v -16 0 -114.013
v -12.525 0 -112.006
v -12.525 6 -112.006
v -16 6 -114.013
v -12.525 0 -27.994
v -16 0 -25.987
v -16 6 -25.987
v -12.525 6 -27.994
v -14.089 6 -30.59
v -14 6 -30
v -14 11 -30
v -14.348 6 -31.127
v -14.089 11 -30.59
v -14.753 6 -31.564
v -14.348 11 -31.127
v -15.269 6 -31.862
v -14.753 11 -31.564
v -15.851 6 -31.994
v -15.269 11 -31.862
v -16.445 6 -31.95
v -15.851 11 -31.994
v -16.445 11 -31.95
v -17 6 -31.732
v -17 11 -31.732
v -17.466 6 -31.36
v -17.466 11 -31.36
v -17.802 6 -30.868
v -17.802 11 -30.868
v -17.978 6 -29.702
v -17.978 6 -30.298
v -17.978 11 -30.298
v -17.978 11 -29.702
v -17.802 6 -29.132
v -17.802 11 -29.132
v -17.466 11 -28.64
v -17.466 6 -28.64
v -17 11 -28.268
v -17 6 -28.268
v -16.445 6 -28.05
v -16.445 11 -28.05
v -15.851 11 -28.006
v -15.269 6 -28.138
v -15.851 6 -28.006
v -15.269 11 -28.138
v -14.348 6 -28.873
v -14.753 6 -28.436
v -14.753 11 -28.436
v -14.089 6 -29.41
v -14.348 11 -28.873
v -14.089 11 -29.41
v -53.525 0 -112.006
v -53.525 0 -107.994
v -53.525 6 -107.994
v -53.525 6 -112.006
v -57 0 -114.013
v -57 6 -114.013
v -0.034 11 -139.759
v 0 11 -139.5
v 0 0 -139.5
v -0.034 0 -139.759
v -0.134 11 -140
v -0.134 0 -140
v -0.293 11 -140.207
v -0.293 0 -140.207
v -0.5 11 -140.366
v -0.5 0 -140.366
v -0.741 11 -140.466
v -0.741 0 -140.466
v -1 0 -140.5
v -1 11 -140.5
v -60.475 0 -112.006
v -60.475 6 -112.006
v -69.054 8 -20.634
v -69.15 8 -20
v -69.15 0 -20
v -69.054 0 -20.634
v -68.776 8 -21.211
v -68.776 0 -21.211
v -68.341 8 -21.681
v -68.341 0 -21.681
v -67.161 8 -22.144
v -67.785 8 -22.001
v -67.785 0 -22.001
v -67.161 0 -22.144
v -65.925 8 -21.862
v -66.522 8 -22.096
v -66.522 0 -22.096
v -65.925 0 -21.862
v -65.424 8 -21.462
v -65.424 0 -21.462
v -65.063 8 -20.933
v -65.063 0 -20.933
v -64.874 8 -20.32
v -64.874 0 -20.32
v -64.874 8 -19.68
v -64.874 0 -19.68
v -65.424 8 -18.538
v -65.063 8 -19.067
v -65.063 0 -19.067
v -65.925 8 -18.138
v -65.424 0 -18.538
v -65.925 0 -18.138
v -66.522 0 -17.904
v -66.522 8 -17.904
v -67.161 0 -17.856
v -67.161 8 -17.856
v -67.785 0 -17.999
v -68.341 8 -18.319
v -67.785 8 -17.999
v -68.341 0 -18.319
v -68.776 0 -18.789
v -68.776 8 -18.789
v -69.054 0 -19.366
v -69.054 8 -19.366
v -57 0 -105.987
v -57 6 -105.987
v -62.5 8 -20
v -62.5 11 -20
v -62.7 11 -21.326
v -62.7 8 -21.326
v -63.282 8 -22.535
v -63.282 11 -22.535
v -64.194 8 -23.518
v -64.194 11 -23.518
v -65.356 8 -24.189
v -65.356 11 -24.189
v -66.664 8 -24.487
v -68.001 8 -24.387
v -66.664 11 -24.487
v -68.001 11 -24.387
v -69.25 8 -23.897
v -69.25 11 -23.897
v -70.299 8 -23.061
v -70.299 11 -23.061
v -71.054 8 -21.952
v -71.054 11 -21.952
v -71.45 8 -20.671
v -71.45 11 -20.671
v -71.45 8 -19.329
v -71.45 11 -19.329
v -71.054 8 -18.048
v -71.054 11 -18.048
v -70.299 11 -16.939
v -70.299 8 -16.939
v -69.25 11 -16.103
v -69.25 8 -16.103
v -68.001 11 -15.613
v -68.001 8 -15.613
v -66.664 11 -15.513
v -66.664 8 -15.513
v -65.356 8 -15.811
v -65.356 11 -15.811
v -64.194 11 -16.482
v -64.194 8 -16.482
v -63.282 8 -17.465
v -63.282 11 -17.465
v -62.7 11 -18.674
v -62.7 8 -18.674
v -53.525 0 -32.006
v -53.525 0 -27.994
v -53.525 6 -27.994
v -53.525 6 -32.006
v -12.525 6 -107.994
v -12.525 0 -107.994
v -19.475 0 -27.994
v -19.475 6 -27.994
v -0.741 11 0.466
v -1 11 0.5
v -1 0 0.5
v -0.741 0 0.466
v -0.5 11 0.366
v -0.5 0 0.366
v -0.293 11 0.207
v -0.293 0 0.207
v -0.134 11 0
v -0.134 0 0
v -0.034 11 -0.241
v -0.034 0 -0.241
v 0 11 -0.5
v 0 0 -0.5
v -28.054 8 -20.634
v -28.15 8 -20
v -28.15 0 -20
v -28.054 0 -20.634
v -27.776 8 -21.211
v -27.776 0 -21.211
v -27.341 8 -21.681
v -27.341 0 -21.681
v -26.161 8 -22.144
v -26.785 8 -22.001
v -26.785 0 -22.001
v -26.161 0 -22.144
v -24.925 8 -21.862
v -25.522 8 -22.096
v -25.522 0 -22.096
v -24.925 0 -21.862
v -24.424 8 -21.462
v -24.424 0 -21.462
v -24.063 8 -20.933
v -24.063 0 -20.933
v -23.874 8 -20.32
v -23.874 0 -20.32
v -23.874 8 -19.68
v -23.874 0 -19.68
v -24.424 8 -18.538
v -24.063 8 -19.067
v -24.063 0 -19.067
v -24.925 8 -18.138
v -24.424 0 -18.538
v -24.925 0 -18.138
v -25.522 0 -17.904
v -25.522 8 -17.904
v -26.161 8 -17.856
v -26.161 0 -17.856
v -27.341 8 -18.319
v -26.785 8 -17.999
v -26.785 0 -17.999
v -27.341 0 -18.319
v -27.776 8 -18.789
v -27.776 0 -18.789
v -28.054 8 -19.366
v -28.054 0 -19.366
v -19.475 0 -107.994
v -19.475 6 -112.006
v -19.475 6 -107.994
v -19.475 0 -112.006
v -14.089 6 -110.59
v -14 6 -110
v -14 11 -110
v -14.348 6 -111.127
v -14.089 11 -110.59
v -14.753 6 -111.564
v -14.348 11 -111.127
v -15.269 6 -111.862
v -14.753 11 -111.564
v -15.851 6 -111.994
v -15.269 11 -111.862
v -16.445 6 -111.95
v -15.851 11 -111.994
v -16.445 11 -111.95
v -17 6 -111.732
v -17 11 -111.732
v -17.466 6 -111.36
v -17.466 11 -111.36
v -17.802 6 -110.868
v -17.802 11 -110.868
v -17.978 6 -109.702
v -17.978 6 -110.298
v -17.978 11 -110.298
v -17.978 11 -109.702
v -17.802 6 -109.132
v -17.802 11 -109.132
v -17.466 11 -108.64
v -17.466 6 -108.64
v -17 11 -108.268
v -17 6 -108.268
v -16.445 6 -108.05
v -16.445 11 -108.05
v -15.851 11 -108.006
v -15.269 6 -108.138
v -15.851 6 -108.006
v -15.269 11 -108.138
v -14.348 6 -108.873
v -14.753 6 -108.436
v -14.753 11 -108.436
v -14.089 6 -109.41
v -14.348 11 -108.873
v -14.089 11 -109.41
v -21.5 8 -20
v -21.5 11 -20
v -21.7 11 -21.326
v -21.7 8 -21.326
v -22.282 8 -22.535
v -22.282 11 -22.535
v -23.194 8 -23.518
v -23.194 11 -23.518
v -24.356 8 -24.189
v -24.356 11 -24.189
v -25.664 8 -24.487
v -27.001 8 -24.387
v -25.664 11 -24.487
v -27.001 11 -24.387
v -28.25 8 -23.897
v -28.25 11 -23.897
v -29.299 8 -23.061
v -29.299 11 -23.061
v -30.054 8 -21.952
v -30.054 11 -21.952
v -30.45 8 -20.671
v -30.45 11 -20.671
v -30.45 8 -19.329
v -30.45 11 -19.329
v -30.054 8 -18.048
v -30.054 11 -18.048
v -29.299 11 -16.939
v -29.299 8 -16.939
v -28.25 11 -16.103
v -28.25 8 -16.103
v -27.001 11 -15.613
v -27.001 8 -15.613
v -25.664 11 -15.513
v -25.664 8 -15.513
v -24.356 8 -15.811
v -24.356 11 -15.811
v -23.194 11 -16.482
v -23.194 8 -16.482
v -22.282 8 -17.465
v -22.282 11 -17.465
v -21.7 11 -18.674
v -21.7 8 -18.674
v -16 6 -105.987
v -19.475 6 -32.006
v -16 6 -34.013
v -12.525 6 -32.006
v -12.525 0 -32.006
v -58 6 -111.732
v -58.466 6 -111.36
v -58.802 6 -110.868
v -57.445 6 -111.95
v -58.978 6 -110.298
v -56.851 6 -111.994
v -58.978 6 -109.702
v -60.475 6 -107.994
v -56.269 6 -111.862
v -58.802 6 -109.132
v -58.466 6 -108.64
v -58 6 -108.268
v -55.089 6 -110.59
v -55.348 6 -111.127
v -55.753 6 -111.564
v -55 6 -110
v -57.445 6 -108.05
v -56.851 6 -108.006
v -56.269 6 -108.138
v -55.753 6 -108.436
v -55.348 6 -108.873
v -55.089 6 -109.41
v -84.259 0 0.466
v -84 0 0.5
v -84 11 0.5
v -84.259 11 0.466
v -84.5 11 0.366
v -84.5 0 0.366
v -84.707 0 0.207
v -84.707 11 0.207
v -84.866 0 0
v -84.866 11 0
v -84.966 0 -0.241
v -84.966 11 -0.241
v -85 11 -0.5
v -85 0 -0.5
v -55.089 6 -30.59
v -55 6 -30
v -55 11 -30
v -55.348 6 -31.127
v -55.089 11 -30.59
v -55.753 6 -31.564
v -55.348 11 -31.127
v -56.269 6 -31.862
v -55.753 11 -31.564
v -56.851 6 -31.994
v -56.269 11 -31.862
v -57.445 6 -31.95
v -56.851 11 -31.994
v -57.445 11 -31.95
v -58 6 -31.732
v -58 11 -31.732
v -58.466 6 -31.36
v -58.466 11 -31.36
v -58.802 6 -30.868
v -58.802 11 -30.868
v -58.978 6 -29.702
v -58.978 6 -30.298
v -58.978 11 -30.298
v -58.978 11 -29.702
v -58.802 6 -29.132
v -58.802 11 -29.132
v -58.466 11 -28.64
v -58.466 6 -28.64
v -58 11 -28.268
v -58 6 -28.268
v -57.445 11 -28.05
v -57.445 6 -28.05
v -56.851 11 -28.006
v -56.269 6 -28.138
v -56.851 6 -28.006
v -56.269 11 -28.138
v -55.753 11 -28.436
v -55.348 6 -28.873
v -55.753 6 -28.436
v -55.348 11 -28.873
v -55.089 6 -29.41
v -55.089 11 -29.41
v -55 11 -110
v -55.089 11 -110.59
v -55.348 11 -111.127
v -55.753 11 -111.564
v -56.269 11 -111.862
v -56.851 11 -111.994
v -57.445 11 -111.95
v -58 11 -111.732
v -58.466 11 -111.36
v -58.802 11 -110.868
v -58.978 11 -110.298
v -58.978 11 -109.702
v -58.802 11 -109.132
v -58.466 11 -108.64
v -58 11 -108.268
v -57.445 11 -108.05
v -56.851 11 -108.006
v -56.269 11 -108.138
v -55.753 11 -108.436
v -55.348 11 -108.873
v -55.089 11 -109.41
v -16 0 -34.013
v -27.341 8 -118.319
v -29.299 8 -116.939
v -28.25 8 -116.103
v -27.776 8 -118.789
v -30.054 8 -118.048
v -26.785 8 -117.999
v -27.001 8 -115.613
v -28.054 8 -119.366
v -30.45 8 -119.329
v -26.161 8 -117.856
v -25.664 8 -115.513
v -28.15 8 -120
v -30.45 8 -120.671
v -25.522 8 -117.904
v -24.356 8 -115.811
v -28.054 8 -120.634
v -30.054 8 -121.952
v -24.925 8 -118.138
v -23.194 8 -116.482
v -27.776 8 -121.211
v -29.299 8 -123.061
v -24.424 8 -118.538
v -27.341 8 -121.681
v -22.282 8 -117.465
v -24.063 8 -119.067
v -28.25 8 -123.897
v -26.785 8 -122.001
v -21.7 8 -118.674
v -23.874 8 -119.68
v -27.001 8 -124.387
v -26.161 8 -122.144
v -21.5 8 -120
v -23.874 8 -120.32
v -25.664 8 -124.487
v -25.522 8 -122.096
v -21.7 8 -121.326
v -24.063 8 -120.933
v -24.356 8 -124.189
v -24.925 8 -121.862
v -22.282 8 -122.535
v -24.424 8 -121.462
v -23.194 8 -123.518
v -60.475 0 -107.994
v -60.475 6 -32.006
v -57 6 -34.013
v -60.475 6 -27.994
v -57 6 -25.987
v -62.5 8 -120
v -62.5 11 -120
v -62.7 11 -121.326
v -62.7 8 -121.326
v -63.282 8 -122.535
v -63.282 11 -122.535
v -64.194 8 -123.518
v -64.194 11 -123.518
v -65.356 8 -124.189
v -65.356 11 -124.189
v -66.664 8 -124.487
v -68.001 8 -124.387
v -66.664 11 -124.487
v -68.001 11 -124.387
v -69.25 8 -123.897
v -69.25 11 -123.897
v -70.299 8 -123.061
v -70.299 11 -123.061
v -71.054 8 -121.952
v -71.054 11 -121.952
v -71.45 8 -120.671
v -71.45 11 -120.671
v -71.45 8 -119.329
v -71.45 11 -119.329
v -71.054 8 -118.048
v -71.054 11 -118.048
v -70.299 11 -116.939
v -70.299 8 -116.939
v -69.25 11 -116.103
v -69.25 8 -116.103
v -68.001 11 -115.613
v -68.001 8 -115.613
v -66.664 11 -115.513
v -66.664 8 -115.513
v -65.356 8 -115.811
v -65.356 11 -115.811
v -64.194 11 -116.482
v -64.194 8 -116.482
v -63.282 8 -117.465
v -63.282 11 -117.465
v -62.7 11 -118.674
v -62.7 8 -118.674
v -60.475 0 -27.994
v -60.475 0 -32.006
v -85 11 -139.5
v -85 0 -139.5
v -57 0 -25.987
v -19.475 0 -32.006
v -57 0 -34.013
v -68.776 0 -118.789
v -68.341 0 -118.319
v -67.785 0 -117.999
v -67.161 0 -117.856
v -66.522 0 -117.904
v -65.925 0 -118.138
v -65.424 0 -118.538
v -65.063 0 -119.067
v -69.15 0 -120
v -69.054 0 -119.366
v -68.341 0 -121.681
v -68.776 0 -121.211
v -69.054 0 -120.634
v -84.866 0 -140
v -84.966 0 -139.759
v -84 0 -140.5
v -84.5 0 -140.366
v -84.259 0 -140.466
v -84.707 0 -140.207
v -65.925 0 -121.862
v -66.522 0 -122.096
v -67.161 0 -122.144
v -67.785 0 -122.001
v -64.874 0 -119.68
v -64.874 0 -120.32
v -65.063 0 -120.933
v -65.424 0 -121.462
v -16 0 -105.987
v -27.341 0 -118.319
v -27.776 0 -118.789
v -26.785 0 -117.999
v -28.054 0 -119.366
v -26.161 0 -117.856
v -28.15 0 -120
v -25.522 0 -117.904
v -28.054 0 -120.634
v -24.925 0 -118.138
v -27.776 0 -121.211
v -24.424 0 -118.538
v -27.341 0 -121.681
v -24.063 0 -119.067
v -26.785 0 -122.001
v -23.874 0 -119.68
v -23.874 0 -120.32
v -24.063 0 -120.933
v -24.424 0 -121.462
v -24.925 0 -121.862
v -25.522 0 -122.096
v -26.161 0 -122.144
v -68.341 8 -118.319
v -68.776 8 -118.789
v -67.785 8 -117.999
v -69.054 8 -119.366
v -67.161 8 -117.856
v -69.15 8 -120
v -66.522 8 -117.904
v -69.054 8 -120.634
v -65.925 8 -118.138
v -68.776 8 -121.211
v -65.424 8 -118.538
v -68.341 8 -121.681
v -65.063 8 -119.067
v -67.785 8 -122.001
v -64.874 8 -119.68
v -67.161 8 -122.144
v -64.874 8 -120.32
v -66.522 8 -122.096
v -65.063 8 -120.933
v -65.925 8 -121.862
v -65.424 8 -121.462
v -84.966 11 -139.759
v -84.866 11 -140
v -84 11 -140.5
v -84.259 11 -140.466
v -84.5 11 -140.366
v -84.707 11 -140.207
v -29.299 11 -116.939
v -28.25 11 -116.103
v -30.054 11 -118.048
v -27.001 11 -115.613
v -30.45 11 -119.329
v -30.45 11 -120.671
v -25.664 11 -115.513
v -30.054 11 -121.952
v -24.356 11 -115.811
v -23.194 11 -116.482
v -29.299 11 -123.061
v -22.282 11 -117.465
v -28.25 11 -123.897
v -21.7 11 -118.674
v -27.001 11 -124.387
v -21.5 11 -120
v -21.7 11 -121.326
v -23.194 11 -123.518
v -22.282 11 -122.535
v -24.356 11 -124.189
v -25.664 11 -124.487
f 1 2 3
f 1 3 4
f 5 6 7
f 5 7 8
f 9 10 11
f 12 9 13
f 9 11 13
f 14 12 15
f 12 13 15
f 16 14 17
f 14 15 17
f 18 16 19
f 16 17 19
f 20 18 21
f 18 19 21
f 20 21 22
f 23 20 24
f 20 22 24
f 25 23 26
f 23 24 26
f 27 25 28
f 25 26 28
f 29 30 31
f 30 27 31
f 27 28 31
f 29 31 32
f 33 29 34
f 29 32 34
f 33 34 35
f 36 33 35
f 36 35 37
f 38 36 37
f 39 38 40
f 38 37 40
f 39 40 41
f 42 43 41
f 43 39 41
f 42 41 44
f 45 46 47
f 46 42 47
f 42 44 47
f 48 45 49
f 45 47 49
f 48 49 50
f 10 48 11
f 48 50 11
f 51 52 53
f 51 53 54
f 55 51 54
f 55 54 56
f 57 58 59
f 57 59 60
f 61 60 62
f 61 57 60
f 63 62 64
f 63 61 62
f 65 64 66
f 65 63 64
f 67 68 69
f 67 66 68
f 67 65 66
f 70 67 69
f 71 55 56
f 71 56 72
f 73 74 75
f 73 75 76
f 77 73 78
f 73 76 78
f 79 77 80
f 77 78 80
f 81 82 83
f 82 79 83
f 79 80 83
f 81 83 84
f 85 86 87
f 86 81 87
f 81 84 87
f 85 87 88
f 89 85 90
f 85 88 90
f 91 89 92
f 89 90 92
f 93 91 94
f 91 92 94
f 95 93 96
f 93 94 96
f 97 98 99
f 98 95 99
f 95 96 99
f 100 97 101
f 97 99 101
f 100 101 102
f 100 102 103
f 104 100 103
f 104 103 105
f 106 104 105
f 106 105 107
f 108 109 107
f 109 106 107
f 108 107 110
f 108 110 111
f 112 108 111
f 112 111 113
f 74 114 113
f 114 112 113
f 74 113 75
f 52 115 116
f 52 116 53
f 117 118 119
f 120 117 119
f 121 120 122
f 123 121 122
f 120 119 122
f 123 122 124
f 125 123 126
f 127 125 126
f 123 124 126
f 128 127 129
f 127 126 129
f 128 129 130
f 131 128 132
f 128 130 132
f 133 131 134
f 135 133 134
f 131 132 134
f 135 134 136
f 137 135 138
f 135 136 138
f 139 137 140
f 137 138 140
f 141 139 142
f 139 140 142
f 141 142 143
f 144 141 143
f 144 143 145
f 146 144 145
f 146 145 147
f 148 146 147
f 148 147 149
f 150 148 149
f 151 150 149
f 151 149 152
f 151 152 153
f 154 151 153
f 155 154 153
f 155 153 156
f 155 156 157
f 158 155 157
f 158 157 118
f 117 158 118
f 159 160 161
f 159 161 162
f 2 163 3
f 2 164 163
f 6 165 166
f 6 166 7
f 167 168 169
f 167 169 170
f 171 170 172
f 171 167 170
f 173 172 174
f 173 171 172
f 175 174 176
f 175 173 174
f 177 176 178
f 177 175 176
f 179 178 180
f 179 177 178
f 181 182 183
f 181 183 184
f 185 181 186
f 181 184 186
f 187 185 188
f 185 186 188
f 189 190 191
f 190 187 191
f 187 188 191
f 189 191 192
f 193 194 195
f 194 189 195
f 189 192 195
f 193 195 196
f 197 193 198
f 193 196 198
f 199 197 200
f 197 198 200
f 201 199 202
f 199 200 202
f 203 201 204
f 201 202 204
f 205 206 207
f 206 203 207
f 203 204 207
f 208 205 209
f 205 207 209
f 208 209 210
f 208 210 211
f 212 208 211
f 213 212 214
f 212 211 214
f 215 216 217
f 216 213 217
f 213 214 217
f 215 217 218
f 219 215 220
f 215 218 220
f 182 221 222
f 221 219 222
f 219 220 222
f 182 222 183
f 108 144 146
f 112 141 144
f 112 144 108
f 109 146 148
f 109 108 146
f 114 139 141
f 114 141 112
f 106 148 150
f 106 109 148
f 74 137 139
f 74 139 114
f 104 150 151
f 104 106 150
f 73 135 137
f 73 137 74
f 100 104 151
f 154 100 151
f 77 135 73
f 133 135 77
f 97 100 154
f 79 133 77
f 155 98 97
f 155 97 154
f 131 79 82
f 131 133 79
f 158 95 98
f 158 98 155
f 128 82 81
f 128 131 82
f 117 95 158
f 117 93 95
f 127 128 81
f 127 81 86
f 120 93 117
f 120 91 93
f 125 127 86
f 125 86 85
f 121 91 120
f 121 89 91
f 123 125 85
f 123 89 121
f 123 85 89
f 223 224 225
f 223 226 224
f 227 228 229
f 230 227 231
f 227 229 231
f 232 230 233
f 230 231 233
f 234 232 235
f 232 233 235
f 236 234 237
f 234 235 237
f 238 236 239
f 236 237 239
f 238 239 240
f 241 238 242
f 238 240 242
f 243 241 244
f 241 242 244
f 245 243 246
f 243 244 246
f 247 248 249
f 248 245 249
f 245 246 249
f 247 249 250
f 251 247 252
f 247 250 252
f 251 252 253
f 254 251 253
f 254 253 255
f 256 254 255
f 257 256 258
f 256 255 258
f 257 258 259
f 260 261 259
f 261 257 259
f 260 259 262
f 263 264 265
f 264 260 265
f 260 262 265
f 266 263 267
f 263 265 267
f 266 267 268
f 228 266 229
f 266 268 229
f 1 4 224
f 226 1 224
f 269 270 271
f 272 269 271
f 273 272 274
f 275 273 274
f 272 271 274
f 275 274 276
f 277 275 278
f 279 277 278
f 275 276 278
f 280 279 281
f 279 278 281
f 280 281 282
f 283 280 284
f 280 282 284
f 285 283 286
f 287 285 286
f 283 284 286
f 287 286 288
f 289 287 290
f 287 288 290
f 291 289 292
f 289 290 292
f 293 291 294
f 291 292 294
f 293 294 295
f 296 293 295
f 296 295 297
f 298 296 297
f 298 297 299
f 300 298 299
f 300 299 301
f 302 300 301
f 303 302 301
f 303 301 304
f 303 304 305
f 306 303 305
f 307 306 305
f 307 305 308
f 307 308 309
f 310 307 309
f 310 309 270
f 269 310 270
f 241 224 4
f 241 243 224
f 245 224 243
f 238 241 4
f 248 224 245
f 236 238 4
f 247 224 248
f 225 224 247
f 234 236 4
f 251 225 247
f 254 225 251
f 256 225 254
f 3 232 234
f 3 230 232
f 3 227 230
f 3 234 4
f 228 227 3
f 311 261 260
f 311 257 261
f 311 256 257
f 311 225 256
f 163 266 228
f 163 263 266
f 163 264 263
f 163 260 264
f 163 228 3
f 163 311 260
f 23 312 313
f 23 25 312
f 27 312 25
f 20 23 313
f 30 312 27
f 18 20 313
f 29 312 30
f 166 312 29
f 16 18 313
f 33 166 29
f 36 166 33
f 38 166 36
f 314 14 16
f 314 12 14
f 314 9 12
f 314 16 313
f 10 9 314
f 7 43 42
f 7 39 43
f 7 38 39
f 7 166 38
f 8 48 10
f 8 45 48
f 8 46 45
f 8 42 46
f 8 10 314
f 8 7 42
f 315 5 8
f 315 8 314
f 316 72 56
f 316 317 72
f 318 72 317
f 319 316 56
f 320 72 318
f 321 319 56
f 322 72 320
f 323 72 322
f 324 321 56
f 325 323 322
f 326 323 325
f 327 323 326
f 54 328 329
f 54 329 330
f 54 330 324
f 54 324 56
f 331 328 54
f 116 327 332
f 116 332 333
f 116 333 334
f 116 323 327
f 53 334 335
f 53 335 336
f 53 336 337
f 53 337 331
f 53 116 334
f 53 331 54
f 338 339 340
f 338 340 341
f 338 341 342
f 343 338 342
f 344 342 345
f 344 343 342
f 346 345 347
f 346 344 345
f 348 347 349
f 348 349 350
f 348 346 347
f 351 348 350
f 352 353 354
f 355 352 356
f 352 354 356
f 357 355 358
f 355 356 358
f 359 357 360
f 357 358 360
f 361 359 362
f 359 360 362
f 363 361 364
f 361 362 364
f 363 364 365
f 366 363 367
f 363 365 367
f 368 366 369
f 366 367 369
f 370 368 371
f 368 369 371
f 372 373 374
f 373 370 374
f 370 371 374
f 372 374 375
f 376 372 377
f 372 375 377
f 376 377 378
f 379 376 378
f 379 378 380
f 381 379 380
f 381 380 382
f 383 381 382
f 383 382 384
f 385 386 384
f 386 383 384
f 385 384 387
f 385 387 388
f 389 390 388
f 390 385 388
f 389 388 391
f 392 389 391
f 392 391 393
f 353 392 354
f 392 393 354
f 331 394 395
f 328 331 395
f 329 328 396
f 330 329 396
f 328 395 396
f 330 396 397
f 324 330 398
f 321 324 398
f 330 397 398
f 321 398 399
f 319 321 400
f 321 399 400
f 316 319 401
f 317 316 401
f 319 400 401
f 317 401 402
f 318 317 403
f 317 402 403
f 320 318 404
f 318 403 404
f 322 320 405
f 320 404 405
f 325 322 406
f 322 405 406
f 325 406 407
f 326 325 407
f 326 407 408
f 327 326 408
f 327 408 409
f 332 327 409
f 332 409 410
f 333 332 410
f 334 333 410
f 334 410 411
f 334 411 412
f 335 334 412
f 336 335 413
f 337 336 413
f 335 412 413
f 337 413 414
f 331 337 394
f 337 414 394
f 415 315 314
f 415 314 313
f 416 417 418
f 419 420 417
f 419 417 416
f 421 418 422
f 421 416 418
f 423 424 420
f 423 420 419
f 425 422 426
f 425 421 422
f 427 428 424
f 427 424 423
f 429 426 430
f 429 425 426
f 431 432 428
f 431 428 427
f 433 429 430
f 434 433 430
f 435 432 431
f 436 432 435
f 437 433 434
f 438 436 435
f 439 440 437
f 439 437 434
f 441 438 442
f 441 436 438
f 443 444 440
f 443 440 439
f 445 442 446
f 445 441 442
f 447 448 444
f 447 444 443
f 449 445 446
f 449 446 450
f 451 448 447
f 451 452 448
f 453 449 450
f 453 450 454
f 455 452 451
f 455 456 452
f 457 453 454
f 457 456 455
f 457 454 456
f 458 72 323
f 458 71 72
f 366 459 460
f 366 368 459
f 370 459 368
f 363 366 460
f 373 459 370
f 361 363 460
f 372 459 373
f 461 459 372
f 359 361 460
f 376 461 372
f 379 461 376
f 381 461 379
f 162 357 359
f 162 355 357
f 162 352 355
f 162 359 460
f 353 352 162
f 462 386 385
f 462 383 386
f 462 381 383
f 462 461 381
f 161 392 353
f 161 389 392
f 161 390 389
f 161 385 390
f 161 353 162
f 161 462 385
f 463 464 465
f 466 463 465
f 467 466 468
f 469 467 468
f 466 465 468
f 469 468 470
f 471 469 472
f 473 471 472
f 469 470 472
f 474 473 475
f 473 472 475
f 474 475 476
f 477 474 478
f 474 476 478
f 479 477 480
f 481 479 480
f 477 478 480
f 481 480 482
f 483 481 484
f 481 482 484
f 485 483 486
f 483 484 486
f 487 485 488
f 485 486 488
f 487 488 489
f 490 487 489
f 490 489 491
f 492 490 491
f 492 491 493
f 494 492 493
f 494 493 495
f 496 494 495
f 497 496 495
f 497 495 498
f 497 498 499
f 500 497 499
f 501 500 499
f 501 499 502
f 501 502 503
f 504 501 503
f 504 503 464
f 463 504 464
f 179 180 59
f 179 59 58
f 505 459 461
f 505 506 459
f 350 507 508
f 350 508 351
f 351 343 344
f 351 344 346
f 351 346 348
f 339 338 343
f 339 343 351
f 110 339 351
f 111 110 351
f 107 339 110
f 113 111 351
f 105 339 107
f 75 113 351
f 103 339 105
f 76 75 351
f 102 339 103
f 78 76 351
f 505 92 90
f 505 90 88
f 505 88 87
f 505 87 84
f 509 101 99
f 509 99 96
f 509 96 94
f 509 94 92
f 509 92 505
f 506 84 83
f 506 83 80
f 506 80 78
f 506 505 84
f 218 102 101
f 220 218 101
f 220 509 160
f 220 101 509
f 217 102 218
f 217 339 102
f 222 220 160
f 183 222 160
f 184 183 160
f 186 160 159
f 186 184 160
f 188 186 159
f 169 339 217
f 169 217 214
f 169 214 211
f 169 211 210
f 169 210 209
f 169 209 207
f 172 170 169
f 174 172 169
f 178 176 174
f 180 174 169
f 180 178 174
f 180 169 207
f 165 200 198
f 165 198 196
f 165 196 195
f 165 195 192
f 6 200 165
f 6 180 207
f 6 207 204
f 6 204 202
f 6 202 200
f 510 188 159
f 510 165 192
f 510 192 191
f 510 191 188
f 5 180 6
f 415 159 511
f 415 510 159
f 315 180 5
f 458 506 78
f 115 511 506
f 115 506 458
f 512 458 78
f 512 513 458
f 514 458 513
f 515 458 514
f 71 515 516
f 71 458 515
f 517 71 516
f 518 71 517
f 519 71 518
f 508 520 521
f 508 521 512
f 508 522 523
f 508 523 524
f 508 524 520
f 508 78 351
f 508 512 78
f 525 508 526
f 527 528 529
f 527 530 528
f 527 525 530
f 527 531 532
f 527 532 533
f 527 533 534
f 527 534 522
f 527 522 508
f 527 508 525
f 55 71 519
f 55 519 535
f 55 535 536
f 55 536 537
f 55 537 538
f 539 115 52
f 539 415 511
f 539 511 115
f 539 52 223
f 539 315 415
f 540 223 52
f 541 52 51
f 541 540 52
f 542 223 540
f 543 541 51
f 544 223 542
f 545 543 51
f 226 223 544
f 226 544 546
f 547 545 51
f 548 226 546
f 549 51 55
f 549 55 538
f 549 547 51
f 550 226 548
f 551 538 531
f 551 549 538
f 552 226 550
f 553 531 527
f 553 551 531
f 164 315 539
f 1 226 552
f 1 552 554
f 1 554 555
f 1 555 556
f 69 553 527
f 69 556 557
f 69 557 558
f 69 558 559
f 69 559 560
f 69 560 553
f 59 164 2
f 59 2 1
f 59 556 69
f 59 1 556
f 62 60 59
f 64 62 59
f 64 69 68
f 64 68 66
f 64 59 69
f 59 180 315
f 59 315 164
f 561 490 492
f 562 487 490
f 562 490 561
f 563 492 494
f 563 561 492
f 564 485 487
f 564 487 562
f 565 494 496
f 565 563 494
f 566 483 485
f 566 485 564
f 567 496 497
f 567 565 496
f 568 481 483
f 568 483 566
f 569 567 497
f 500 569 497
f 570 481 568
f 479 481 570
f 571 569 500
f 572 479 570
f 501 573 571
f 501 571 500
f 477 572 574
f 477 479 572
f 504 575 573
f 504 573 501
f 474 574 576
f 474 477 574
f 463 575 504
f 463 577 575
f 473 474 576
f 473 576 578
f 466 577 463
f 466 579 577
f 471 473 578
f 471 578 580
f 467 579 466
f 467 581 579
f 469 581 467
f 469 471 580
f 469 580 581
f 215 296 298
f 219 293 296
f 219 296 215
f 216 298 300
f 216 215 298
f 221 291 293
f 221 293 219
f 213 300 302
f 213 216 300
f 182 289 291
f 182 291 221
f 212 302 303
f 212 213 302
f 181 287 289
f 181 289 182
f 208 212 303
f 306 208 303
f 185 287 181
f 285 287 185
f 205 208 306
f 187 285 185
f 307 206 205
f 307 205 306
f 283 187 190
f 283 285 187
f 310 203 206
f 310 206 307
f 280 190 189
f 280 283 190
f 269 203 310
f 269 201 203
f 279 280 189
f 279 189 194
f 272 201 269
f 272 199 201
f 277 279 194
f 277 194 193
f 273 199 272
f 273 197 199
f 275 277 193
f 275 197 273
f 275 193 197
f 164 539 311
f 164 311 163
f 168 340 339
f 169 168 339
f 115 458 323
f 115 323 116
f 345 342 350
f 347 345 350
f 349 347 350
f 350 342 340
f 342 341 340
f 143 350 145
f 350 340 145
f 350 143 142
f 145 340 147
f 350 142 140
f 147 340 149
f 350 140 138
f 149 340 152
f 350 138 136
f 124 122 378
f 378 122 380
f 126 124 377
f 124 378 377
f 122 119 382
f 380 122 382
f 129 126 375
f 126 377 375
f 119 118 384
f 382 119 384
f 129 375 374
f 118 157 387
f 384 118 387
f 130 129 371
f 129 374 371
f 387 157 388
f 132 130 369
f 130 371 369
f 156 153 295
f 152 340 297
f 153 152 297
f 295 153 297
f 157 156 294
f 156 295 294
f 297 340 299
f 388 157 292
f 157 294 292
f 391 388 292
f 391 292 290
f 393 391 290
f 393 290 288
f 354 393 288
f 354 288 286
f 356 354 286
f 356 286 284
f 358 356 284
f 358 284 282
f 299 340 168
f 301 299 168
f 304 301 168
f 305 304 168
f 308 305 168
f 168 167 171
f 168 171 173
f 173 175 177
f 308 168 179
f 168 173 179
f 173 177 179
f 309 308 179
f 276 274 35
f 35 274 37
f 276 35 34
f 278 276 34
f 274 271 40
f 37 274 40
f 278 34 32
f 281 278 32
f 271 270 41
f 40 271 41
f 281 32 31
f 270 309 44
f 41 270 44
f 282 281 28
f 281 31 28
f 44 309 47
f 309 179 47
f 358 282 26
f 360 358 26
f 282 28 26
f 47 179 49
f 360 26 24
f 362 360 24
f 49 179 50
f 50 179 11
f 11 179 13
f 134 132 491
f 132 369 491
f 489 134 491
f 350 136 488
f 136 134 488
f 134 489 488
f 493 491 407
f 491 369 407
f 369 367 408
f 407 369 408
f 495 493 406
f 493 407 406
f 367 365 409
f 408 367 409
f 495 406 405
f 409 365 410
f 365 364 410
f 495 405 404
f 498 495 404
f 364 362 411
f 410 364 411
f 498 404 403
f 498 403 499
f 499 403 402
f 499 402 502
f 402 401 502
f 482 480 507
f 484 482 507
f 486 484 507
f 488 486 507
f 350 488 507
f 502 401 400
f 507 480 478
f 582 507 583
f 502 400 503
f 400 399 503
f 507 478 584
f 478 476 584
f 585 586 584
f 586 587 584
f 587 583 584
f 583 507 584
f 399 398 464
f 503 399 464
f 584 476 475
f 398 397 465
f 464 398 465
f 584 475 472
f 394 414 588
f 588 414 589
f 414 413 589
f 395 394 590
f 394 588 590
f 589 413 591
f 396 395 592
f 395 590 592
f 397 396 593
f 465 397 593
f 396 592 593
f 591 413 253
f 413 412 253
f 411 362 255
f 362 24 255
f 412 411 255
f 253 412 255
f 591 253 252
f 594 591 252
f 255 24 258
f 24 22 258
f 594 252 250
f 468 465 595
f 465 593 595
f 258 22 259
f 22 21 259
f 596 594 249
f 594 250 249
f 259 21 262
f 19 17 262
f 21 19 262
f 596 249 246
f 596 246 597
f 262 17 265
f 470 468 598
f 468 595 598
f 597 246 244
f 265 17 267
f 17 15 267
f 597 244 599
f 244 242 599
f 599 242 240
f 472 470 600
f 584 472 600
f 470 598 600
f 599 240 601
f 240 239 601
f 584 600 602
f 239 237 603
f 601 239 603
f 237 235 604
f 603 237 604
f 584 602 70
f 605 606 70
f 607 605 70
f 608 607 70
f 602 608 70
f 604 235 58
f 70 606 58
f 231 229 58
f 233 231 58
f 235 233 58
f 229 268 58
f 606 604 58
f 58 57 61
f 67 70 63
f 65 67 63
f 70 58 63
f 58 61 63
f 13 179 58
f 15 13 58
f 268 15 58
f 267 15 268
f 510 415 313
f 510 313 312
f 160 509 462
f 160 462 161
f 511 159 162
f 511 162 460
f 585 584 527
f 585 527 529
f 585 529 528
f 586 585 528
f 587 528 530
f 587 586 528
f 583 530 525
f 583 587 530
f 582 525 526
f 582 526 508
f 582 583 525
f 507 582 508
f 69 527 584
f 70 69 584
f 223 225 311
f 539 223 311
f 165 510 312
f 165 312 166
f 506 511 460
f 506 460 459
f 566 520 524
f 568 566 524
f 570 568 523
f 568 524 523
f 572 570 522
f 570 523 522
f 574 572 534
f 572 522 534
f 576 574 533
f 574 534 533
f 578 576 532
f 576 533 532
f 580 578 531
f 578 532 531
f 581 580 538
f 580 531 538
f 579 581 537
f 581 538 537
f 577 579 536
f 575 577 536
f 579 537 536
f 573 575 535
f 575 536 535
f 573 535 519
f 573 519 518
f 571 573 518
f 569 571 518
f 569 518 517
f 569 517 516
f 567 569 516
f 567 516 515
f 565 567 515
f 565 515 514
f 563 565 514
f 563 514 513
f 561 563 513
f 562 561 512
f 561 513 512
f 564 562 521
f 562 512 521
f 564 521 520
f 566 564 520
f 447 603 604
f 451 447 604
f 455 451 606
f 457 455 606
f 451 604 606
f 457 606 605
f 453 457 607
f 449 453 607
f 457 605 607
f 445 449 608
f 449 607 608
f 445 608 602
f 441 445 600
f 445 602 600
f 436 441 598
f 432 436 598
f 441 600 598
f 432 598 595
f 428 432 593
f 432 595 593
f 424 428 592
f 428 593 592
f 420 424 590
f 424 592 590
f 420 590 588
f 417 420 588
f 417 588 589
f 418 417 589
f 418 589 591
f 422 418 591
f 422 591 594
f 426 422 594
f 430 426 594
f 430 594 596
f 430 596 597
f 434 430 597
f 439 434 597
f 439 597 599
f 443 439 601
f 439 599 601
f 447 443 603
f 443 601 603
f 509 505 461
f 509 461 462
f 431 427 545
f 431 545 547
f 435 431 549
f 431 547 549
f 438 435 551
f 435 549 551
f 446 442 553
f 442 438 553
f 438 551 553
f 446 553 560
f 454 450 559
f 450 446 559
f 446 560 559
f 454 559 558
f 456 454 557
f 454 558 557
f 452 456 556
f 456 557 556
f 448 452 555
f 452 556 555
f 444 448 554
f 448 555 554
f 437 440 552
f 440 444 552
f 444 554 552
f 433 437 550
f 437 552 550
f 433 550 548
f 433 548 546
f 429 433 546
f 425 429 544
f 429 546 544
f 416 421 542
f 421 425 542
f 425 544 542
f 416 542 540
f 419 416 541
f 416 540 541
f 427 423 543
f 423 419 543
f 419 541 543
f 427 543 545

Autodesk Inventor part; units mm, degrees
ref_plane "YZ Plane" through (0, 0, 0) normal (1, 0, 0) x (0, 1, 0)
ref_plane "XZ Plane" through (0, 0, 0) normal (0, 1, 0) x (-1, 0, 0)
ref_plane "XY Plane" through (0, 0, 0) normal (0, 0, 1) x (1, 0, 0)
sketch "Esboço1" plane through (0, 0, 0) normal (0, 1, 0) x (-1, 0, 0)
  line L0 (0, 0) -> (77, 0)
  line L1 (77, 0) -> (77, -140)
  line L2 (77, -140) -> (0, -140)
  line L3 (0, -140) -> (0, 0)
  circle A0 centre (67, -20) radius 2.15
  circle A1 centre (67, -120) radius 2.15
  circle A2 centre (26, -20) radius 2.15
  circle A3 centre (26, -120) radius 2.15
  dimension "d0" = 77
  dimension "d1" = 140
  dimension "d2" = 4.3
  dimension "d3" = 4.3
  dimension "d4" = 4.3
  dimension "d5" = 4.3
  dimension "d6" = 10
  dimension "d7" = 10
  dimension "d8" = 20
  dimension "d9" = 20
  dimension "d10" = 20
  dimension "d11" = 20
  dimension "d12" = 26
  dimension "d13" = 26
extrude "Extrusão1" add sketch "Esboço1" along normal blind 11
sketch "Esboço2" plane through (0, 11, 0) normal (0, 1, 0) x (1, 0, 0)
  circle A0 centre (-67, 20) radius 2.15 projected
  circle A1 centre (-26, 20) radius 2.15 projected
  circle A2 centre (-26, 120) radius 2.15 projected
  circle A3 centre (-67, 120) radius 2.15 projected
  circle A4 centre (-67, 20) radius 4.5
  circle A5 centre (-67, 120) radius 2.15 projected
  circle A6 centre (-67, 120) radius 4.5
  circle A7 centre (-26, 120) radius 2.15 projected
  circle A8 centre (-26, 120) radius 4.5
  circle A9 centre (-26, 20) radius 2.15 projected
  circle A10 centre (-26, 20) radius 4.5
  point P0 (0, 0)
  dimension "d16" = 9
  dimension "d17" = 9
  dimension "d18" = 9
  dimension "d19" = 9
extrude "Extrusão2" cut sketch "Esboço2" against normal blind 3 contours A3 | A4 | A6 | A8 | A10
sketch "Esboço3" plane through (0, 11, 0) normal (0, 1, 0) x (1, 0, 0)
  point P0 (0, 0)
sketch "Esboço4" plane through (0, 11, 0) normal (0, 1, 0) x (1, 0, 0)
  circle A0 centre (-57, 30) radius 2
  circle A1 centre (-57, 110) radius 2
  circle A2 centre (-67, 20) radius 2.15 projected
  circle A3 centre (-67, 120) radius 2.15 projected
  circle A4 centre (-16, 30) radius 2
  circle A5 centre (-16, 110) radius 2
  circle A6 centre (-26, 20) radius 2.15 projected
  circle A7 centre (-26, 120) radius 2.15 projected
  point P0 (0, 0)
  dimension "d22" = 4
  dimension "d23" = 4
  dimension "d24" = 10
  dimension "d25" = 10
  dimension "d26" = 10
  dimension "d27" = 10
  dimension "d28" = 4
  dimension "d29" = 4
  dimension "d30" = 10
  dimension "d31" = 10
  dimension "d32" = 10
  dimension "d33" = 10
extrude "Extrusão3" cut sketch "Esboço4" against normal blind 12 contours A0 | A1 | A4 | A5
sketch "Esboço5" plane through (0, 0, 0) normal (0, -1, 0) x (1, 0, 0)
  circle A0 centre (-57, -110) radius 2 projected
  circle A1 centre (-16, -110) radius 2 projected
  circle A2 centre (-16, -30) radius 2 projected
  circle A3 centre (-57, -30) radius 2 projected
  line L0 (-53.525, -112.0063) -> (-57, -114.0126)
  line L1 (-57, -114.0126) -> (-60.475, -112.0063)
  line L2 (-60.475, -112.0063) -> (-60.475, -107.9937)
  line L3 (-60.475, -107.9937) -> (-57, -105.9874)
  line L4 (-57, -105.9874) -> (-53.525, -107.9937)
  line L5 (-53.525, -107.9937) -> (-53.525, -112.0063)
  line L6 (-53.525, -32.0063) -> (-57, -34.0126)
  line L7 (-57, -34.0126) -> (-60.475, -32.0063)
  line L8 (-60.475, -32.0063) -> (-60.475, -27.9937)
  line L9 (-60.475, -27.9937) -> (-57, -25.9874)
  line L10 (-57, -25.9874) -> (-53.525, -27.9937)
  line L11 (-53.525, -27.9937) -> (-53.525, -32.0063)
  line L12 (-16, -105.9874) -> (-12.525, -107.9937)
  line L13 (-12.525, -107.9937) -> (-12.525, -112.0063)
  line L14 (-12.525, -112.0063) -> (-16, -114.0126)
  line L15 (-16, -114.0126) -> (-19.475, -112.0063)
  line L16 (-19.475, -112.0063) -> (-19.475, -107.9937)
  line L17 (-19.475, -107.9937) -> (-16, -105.9874)
  circle A4 centre (-16, -30) radius 2 projected
  line L18 (-12.525, -32.0063) -> (-16, -34.0126)
  line L19 (-16, -34.0126) -> (-19.475, -32.0063)
  line L20 (-19.475, -32.0063) -> (-19.475, -27.9937)
  line L21 (-19.475, -27.9937) -> (-16, -25.9874)
  line L22 (-16, -25.9874) -> (-12.525, -27.9937)
  line L23 (-12.525, -27.9937) -> (-12.525, -32.0063)
  line L24 (-77, -140) -> (-77, 0) projected
  line L25 (0, 0) -> (0, -140) projected
  dimension "d36" = 6.95
  dimension "d37" = 6.95
  dimension "d38" = 6.95
  dimension "d39" = 6.95
extrude "Extrusão4" cut sketch "Esboço5" against normal blind 6 contours A0 | L0 L1 L2 L3 L4 L5 | L6 L7 L8 L9 L10 L11 | L12 L13 L14 L15 L16 L17 | L18 L19 L20 L21 L22 L23
sketch "Esboço6" plane through (-77, 0, 0) normal (0, 0, 1) x (1, 0, 0)
  line L0 (0, 0) -> (77, 0) projected
  line L1 (77, 0) -> (77, 11) projected
  line L2 (0, 11) -> (77, 11) projected
  line L3 (0, 0) -> (0, 11) projected
extrude "Extrusão5" add sketch "Esboço6" along normal blind 0.5
sketch "Esboço7" plane through (0, 0, -140) normal (0, 0, -1) x (-1, 0, 0)
  line L0 (0, 0) -> (77, 0) projected
  line L1 (77, 0) -> (77, 11) projected
  line L2 (0, 11) -> (77, 11) projected
  line L3 (0, 0) -> (0, 11) projected
  point P0 (0, 0)
extrude "Extrusão6" add sketch "Esboço7" along normal blind 0.5
sketch "Esboço8" plane through (-77, 0, 0.5) normal (-1, 0, 0) x (0, 0, 1)
  line L0 (0, 0) -> (-141, 0) projected
  line L1 (0, 11) -> (0, 0) projected
  line L2 (0, 11) -> (-141, 11) projected
  line L3 (-141, 0) -> (-141, 11) projected
  point P0 (-0.5, 0)
extrude "Extrusão7" add sketch "Esboço8" along normal blind 8
fillet "Arredondamento1" radius 1 4 edges at (-85, 5.5, 0.5) (0, 5.5, 0.5) (-85, 5.5, -140.5) (0, 5.5, -140.5)
equation "\"d4\" = d3"
equation "\"d5\" = d3"
equation "\"d7\" = d6"
equation "\"d9\" = d8"
equation "\"d10\" = d9"
equation "\"d11\" = d8"
equation "\"d16\" = d19"
equation "\"d26\" = d25"
equation "\"d27\" = d26"
equation "\"d30\" = d24"
equation "\"d33\" = d32"
equation "\"d36\" = d39"
equation "\"d37\" = d39"
equation "\"d38\" = d39"
properties part number "suporte-fonte2_TIPO2"
